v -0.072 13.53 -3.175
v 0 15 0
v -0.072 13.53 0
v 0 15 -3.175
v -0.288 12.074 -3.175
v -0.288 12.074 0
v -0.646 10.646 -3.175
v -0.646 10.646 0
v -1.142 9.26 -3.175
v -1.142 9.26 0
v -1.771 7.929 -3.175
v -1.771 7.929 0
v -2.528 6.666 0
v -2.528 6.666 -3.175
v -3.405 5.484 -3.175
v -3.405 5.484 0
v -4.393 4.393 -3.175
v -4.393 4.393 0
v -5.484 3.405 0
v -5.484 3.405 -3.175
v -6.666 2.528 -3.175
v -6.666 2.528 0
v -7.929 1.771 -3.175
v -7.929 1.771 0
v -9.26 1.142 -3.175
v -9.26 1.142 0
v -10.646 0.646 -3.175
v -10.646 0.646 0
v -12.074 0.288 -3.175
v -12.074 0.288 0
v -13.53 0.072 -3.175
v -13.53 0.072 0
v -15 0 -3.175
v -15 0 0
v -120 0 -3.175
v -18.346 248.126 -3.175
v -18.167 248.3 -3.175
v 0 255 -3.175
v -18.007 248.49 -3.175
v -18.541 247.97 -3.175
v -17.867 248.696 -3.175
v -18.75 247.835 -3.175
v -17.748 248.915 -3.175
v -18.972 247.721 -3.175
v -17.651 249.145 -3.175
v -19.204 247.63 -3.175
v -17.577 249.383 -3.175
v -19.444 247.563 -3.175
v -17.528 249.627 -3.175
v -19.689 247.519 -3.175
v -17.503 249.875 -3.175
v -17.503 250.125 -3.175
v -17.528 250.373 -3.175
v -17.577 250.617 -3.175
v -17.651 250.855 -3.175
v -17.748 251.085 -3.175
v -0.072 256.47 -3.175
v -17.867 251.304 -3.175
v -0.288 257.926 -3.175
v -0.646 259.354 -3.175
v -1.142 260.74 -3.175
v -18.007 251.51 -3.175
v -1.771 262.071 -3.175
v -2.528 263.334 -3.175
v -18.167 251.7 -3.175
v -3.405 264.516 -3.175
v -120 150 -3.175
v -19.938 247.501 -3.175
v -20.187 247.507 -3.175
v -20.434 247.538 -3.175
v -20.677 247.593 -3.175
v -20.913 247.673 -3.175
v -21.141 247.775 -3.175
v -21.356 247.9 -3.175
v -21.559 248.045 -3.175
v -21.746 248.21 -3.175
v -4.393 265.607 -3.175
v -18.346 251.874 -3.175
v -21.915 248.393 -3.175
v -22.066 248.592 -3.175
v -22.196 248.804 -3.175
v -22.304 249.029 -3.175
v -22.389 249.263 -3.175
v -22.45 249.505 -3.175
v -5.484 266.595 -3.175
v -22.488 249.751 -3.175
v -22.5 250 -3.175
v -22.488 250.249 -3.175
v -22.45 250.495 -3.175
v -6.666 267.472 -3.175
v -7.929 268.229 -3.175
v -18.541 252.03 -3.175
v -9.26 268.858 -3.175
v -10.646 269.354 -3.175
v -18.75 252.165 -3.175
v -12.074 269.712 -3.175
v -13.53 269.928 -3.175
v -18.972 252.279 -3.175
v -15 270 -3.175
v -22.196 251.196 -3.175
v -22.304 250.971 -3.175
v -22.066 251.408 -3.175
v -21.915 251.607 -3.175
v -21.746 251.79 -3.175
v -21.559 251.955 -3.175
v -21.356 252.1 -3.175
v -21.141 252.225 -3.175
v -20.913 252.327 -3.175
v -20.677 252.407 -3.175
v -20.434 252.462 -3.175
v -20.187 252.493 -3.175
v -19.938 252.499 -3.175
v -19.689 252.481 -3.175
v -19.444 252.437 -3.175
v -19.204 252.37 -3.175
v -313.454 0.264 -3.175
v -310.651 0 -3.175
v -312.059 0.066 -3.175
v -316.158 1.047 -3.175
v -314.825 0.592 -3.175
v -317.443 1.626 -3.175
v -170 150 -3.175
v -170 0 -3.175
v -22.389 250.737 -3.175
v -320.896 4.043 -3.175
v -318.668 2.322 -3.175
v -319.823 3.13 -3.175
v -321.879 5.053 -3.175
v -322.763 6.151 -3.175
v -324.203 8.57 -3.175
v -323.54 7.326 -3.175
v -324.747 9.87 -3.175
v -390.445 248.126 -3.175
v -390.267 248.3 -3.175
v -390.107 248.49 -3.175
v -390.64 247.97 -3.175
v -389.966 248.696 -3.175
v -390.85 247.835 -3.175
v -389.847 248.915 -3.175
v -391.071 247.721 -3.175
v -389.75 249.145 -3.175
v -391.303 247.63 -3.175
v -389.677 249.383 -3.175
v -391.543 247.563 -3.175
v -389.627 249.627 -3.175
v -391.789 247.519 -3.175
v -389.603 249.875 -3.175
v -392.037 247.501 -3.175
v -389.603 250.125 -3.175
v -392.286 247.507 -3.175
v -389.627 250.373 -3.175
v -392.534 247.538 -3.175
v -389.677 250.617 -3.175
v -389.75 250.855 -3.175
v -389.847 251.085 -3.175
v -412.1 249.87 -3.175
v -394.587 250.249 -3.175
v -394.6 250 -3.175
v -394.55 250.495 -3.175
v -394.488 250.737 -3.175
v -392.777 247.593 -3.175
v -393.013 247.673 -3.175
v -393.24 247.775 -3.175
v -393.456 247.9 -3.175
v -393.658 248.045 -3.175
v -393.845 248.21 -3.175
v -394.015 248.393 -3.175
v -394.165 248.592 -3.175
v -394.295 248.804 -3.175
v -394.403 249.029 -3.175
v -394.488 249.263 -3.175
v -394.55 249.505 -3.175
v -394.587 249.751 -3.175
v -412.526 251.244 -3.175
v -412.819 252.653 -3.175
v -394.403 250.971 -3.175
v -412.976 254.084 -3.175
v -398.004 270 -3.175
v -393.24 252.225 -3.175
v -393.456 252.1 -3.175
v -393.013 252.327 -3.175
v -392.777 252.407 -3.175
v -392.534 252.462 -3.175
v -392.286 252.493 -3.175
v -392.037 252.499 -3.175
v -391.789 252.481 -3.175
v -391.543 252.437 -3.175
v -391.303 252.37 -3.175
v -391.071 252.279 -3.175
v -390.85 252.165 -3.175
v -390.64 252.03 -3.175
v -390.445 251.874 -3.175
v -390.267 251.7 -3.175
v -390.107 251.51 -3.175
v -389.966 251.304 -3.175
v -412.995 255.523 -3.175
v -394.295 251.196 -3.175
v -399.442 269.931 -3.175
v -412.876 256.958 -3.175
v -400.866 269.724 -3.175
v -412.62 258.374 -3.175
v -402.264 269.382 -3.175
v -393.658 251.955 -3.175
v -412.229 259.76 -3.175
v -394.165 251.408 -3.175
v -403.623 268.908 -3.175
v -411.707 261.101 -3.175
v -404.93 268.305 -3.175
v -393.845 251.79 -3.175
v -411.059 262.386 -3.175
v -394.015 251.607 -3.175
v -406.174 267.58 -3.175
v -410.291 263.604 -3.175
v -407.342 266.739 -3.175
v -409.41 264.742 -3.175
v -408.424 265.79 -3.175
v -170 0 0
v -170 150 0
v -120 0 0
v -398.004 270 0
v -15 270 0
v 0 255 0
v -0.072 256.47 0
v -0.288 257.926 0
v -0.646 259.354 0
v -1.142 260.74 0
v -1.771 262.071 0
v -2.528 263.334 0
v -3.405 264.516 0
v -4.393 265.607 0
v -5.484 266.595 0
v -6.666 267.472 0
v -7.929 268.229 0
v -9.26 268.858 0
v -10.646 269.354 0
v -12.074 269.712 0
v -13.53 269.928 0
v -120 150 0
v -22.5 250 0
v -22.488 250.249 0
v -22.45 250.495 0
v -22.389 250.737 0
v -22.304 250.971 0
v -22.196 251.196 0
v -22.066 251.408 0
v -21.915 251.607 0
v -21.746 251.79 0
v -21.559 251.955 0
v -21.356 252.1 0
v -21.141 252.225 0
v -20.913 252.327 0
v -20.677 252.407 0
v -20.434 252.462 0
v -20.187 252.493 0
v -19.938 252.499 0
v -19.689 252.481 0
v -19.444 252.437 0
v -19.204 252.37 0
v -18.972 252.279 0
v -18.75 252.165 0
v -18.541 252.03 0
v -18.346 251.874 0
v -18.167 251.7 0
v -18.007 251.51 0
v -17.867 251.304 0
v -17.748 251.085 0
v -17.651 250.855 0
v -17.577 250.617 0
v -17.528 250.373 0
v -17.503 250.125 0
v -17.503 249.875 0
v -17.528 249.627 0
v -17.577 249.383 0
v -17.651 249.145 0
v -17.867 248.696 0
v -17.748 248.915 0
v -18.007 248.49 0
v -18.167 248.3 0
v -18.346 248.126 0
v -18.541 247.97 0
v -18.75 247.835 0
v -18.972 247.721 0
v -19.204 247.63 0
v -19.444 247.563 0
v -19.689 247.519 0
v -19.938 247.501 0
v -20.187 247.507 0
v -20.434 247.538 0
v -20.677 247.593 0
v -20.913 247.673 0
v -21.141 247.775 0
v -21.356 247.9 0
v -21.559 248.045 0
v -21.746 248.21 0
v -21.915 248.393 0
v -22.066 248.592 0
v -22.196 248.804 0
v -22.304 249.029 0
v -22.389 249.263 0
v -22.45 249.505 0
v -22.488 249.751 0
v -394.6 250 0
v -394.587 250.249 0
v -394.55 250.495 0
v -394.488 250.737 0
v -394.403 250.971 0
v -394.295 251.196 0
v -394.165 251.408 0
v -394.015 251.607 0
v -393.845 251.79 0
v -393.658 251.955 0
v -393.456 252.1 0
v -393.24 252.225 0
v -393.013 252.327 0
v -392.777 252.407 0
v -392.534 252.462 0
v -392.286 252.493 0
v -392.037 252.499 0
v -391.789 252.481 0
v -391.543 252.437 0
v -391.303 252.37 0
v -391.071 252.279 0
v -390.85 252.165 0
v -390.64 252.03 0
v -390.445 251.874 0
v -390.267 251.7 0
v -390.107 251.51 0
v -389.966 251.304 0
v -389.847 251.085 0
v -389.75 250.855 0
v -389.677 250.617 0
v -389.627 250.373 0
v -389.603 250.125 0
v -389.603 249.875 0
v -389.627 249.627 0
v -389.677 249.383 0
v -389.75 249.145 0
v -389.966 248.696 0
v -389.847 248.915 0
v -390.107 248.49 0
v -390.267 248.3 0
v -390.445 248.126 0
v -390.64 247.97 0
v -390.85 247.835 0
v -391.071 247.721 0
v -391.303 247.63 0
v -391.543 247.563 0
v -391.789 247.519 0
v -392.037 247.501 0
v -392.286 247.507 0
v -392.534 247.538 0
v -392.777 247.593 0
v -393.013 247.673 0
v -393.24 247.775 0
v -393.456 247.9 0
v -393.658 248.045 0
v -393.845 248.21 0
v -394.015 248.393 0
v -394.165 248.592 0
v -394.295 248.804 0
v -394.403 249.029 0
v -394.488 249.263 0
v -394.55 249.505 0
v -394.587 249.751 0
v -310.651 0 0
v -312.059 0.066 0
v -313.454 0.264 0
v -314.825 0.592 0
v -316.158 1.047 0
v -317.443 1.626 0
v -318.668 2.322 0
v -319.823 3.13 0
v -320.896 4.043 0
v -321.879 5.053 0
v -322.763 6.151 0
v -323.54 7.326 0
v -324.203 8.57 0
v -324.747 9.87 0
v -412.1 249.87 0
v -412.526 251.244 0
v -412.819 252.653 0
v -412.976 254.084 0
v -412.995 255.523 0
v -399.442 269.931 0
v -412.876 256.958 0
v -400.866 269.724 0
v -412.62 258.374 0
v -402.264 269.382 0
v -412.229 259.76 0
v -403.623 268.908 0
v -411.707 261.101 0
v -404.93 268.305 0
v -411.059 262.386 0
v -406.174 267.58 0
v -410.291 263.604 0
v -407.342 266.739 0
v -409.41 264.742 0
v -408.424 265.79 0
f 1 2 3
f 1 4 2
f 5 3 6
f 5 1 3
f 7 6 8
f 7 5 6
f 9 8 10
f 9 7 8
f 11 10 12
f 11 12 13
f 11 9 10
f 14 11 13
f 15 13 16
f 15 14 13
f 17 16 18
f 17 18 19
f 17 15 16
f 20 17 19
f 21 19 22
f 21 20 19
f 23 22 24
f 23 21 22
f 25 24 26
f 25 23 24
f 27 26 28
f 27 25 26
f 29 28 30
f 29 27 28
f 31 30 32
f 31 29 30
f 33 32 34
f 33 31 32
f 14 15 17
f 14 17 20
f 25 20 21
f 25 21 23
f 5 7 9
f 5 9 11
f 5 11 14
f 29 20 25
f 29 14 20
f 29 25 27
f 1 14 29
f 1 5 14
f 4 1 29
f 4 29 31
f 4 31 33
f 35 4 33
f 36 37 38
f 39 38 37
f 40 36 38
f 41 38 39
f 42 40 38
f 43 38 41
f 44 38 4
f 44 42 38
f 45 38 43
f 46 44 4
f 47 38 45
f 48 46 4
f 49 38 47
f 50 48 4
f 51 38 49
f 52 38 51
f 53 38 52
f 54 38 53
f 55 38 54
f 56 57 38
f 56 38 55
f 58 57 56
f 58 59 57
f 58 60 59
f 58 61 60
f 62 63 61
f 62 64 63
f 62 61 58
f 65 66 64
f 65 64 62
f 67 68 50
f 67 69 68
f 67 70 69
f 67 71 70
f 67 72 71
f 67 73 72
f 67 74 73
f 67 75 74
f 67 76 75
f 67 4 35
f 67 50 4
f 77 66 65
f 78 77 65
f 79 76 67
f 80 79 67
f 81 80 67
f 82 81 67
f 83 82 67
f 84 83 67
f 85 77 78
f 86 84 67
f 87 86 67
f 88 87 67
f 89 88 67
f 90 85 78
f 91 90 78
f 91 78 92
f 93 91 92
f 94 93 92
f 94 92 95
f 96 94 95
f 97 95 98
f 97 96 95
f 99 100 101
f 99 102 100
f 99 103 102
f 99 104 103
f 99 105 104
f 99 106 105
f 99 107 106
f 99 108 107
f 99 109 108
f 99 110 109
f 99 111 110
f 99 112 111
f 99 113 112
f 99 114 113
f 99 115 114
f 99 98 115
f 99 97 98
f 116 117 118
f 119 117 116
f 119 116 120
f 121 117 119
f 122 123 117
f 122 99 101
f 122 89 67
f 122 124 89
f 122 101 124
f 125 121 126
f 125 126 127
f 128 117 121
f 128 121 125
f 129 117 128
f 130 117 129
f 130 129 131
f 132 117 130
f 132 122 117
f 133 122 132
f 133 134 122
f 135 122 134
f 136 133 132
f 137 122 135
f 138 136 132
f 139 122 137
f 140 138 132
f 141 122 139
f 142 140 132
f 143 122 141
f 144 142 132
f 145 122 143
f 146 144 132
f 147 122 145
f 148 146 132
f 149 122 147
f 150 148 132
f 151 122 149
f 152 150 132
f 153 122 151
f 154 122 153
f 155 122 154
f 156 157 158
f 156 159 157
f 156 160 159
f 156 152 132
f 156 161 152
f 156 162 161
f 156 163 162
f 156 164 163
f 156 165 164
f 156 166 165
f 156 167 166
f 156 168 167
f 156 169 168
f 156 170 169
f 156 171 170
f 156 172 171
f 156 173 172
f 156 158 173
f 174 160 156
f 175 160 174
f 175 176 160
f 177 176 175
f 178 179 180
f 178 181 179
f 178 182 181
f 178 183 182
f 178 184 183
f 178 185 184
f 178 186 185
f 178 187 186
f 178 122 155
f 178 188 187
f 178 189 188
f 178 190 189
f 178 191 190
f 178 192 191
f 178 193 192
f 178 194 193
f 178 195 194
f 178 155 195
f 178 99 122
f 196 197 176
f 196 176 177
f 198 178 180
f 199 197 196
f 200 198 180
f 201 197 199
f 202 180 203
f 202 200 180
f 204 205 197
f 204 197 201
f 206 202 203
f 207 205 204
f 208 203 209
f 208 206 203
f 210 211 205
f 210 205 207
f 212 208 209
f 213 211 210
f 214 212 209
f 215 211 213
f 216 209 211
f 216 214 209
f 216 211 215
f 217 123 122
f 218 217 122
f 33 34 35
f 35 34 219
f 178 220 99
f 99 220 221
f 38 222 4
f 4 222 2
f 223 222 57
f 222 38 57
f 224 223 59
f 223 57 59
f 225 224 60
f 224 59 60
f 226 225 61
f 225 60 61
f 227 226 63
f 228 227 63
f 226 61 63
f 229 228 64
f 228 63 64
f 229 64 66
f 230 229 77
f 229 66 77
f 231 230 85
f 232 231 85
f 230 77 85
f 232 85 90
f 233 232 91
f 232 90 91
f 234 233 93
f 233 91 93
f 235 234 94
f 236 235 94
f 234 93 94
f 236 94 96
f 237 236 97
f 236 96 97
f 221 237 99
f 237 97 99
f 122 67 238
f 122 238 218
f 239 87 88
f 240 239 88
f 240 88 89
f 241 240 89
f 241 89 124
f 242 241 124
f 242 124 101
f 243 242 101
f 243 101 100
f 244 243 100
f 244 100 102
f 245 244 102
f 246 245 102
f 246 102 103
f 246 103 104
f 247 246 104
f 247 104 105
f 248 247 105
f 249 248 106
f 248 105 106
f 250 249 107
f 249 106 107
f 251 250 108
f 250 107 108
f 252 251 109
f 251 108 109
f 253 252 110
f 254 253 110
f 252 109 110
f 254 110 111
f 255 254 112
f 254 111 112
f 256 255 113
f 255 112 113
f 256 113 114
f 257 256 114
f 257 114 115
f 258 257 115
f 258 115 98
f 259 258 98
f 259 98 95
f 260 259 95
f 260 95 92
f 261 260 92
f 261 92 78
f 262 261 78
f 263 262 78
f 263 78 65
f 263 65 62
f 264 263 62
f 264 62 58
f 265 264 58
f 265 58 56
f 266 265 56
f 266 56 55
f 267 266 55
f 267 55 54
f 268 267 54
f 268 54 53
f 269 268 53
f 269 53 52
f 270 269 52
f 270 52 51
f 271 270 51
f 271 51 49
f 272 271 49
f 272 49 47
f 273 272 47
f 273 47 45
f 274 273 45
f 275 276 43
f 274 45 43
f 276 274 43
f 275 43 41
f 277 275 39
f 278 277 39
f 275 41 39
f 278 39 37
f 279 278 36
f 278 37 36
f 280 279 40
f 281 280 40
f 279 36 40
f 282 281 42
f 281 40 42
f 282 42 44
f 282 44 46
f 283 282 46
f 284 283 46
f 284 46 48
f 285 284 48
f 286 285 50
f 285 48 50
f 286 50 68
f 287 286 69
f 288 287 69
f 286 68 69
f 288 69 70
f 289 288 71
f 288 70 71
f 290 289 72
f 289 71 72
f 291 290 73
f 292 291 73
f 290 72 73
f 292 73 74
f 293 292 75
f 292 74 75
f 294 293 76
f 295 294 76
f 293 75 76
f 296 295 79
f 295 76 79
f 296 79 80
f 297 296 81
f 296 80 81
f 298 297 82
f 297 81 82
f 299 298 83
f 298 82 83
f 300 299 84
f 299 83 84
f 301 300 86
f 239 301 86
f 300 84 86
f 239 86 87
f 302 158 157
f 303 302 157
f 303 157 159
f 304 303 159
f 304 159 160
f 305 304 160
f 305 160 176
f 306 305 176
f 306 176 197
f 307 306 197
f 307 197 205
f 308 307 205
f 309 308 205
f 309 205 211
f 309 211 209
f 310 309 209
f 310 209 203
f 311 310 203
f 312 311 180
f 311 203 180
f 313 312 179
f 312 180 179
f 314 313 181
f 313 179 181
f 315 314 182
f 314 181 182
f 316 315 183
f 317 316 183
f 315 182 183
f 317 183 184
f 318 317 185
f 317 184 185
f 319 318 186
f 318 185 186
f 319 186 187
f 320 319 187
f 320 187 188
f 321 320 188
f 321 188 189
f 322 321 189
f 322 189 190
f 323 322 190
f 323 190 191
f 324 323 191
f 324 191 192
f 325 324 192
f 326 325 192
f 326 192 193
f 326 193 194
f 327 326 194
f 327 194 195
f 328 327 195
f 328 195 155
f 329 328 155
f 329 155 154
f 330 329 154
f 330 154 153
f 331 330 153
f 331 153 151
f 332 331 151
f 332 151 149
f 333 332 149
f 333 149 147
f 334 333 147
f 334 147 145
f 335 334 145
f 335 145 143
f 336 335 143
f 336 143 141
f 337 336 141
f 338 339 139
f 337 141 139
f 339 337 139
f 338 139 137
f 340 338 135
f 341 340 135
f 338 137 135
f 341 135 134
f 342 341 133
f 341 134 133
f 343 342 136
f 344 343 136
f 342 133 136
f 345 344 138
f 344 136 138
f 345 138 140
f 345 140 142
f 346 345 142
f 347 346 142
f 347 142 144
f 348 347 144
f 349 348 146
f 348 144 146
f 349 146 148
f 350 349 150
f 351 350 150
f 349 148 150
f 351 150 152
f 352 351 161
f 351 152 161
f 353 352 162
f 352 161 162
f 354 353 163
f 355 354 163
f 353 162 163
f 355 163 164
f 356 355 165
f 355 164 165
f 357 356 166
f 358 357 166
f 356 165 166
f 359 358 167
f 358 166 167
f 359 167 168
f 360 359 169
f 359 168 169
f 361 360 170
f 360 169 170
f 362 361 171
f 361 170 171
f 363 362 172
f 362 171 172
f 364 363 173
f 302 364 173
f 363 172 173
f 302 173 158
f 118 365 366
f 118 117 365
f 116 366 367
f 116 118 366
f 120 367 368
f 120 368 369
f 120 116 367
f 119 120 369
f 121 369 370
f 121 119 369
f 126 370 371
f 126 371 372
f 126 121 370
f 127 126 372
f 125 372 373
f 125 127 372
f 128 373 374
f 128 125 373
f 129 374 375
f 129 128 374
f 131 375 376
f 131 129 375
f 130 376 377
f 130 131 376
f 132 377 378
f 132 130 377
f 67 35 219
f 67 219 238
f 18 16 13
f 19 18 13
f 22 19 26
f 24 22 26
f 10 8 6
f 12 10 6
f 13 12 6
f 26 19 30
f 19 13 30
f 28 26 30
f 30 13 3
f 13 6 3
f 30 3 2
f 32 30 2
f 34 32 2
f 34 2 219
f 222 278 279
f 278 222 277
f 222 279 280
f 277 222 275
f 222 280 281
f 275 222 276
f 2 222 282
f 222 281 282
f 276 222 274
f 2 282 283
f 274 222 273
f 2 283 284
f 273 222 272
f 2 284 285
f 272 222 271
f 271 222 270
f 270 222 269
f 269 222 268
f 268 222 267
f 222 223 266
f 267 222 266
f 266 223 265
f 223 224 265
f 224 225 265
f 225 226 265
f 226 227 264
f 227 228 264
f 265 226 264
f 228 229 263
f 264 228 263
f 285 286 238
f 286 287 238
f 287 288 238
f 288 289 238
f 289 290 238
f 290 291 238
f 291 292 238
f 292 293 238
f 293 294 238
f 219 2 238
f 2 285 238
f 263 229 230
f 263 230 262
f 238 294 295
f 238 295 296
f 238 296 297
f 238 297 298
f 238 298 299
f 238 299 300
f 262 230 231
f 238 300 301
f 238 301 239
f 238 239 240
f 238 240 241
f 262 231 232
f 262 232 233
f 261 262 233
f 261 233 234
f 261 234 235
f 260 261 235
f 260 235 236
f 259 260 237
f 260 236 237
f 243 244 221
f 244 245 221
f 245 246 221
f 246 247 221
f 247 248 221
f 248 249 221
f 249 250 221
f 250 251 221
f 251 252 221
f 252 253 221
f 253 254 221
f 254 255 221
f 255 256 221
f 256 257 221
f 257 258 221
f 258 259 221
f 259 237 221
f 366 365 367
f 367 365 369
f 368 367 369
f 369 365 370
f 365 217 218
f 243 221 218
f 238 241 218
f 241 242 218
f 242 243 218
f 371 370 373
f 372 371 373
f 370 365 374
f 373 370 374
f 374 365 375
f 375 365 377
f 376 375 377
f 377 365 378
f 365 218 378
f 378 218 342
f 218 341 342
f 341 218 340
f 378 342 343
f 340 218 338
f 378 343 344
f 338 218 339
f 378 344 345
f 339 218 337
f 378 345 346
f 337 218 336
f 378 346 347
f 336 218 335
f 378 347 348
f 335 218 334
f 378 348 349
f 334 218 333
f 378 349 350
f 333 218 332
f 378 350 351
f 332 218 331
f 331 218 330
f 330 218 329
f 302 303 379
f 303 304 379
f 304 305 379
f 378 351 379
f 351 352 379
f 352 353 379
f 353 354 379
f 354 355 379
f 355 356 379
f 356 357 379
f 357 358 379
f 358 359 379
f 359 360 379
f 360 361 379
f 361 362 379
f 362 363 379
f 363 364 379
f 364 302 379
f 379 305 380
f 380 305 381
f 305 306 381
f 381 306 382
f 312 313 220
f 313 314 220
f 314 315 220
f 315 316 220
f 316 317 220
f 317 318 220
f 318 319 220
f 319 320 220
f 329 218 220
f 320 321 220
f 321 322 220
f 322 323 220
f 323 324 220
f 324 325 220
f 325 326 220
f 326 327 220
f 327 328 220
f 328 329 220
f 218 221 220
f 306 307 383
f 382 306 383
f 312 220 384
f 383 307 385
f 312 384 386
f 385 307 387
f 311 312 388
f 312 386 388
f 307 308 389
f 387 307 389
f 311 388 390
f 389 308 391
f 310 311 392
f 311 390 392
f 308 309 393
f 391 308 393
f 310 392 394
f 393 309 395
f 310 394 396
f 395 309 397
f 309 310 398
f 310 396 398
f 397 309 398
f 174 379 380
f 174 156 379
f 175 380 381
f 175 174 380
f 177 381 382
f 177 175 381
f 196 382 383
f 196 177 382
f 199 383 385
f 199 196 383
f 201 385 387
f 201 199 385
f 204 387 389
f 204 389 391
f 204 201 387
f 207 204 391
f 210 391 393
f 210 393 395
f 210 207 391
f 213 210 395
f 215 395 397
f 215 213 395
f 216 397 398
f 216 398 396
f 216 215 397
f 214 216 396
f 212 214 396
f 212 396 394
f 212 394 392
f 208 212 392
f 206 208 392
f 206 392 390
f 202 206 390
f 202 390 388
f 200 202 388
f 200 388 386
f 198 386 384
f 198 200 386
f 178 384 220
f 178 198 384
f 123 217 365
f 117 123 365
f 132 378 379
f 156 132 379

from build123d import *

# Parameters (mm, degrees)
BASE_FLANGE1_DEPTH = 3.175
FILLET1_R          = 15
SKETCH2_W          = 50
SKETCH2_H          = 150
CUT_EXTRUDE1_DEPTH = 10
SKETCH3_R          = 2.5
CUT_EXTRUDE2_DEPTH = 10


# Sheet-metal steps are written as plain solids
with BuildPart() as part:
    # Sketch1 → Base-Flange1 (new body)
    with BuildSketch(Plane.XY):
        Polygon((0, 270), (0, 0), (-321.154386438, 0), (-419.42634969, 270), align=None)
    extrude(amount=-BASE_FLANGE1_DEPTH)

    # Fillet1
    fillet1_edges = [part.edges().sort_by_distance(p)[0] for p in [
        (0, 270, -1.5875),
        (0, 0, -1.5875),
        (-321.154386438, 0, -1.5875),
        (-419.42634969, 270, -1.5875),
    ]]
    fillet(fillet1_edges, radius=FILLET1_R)

    # Sketch2 → Cut-Extrude1 (cut)
    with BuildSketch(Plane(origin=(0, 0, -3.175), x_dir=(-1, 0, 0), z_dir=(0, 0, -1))):
        with Locations((145, 75)):
            Rectangle(SKETCH2_W, SKETCH2_H)
    extrude(amount=-CUT_EXTRUDE1_DEPTH, mode=Mode.SUBTRACT)

    # Sketch3 → Cut-Extrude2 (cut)
    with BuildSketch(Plane(origin=(0, 0, -3.175), x_dir=(-1, 0, 0), z_dir=(0, 0, -1))):
        with Locations((20, 250)):
            Circle(SKETCH3_R)
        with Locations((392.099518901, 250)):
            Circle(SKETCH3_R)
    extrude(amount=-CUT_EXTRUDE2_DEPTH, mode=Mode.SUBTRACT)


solid = part.part
